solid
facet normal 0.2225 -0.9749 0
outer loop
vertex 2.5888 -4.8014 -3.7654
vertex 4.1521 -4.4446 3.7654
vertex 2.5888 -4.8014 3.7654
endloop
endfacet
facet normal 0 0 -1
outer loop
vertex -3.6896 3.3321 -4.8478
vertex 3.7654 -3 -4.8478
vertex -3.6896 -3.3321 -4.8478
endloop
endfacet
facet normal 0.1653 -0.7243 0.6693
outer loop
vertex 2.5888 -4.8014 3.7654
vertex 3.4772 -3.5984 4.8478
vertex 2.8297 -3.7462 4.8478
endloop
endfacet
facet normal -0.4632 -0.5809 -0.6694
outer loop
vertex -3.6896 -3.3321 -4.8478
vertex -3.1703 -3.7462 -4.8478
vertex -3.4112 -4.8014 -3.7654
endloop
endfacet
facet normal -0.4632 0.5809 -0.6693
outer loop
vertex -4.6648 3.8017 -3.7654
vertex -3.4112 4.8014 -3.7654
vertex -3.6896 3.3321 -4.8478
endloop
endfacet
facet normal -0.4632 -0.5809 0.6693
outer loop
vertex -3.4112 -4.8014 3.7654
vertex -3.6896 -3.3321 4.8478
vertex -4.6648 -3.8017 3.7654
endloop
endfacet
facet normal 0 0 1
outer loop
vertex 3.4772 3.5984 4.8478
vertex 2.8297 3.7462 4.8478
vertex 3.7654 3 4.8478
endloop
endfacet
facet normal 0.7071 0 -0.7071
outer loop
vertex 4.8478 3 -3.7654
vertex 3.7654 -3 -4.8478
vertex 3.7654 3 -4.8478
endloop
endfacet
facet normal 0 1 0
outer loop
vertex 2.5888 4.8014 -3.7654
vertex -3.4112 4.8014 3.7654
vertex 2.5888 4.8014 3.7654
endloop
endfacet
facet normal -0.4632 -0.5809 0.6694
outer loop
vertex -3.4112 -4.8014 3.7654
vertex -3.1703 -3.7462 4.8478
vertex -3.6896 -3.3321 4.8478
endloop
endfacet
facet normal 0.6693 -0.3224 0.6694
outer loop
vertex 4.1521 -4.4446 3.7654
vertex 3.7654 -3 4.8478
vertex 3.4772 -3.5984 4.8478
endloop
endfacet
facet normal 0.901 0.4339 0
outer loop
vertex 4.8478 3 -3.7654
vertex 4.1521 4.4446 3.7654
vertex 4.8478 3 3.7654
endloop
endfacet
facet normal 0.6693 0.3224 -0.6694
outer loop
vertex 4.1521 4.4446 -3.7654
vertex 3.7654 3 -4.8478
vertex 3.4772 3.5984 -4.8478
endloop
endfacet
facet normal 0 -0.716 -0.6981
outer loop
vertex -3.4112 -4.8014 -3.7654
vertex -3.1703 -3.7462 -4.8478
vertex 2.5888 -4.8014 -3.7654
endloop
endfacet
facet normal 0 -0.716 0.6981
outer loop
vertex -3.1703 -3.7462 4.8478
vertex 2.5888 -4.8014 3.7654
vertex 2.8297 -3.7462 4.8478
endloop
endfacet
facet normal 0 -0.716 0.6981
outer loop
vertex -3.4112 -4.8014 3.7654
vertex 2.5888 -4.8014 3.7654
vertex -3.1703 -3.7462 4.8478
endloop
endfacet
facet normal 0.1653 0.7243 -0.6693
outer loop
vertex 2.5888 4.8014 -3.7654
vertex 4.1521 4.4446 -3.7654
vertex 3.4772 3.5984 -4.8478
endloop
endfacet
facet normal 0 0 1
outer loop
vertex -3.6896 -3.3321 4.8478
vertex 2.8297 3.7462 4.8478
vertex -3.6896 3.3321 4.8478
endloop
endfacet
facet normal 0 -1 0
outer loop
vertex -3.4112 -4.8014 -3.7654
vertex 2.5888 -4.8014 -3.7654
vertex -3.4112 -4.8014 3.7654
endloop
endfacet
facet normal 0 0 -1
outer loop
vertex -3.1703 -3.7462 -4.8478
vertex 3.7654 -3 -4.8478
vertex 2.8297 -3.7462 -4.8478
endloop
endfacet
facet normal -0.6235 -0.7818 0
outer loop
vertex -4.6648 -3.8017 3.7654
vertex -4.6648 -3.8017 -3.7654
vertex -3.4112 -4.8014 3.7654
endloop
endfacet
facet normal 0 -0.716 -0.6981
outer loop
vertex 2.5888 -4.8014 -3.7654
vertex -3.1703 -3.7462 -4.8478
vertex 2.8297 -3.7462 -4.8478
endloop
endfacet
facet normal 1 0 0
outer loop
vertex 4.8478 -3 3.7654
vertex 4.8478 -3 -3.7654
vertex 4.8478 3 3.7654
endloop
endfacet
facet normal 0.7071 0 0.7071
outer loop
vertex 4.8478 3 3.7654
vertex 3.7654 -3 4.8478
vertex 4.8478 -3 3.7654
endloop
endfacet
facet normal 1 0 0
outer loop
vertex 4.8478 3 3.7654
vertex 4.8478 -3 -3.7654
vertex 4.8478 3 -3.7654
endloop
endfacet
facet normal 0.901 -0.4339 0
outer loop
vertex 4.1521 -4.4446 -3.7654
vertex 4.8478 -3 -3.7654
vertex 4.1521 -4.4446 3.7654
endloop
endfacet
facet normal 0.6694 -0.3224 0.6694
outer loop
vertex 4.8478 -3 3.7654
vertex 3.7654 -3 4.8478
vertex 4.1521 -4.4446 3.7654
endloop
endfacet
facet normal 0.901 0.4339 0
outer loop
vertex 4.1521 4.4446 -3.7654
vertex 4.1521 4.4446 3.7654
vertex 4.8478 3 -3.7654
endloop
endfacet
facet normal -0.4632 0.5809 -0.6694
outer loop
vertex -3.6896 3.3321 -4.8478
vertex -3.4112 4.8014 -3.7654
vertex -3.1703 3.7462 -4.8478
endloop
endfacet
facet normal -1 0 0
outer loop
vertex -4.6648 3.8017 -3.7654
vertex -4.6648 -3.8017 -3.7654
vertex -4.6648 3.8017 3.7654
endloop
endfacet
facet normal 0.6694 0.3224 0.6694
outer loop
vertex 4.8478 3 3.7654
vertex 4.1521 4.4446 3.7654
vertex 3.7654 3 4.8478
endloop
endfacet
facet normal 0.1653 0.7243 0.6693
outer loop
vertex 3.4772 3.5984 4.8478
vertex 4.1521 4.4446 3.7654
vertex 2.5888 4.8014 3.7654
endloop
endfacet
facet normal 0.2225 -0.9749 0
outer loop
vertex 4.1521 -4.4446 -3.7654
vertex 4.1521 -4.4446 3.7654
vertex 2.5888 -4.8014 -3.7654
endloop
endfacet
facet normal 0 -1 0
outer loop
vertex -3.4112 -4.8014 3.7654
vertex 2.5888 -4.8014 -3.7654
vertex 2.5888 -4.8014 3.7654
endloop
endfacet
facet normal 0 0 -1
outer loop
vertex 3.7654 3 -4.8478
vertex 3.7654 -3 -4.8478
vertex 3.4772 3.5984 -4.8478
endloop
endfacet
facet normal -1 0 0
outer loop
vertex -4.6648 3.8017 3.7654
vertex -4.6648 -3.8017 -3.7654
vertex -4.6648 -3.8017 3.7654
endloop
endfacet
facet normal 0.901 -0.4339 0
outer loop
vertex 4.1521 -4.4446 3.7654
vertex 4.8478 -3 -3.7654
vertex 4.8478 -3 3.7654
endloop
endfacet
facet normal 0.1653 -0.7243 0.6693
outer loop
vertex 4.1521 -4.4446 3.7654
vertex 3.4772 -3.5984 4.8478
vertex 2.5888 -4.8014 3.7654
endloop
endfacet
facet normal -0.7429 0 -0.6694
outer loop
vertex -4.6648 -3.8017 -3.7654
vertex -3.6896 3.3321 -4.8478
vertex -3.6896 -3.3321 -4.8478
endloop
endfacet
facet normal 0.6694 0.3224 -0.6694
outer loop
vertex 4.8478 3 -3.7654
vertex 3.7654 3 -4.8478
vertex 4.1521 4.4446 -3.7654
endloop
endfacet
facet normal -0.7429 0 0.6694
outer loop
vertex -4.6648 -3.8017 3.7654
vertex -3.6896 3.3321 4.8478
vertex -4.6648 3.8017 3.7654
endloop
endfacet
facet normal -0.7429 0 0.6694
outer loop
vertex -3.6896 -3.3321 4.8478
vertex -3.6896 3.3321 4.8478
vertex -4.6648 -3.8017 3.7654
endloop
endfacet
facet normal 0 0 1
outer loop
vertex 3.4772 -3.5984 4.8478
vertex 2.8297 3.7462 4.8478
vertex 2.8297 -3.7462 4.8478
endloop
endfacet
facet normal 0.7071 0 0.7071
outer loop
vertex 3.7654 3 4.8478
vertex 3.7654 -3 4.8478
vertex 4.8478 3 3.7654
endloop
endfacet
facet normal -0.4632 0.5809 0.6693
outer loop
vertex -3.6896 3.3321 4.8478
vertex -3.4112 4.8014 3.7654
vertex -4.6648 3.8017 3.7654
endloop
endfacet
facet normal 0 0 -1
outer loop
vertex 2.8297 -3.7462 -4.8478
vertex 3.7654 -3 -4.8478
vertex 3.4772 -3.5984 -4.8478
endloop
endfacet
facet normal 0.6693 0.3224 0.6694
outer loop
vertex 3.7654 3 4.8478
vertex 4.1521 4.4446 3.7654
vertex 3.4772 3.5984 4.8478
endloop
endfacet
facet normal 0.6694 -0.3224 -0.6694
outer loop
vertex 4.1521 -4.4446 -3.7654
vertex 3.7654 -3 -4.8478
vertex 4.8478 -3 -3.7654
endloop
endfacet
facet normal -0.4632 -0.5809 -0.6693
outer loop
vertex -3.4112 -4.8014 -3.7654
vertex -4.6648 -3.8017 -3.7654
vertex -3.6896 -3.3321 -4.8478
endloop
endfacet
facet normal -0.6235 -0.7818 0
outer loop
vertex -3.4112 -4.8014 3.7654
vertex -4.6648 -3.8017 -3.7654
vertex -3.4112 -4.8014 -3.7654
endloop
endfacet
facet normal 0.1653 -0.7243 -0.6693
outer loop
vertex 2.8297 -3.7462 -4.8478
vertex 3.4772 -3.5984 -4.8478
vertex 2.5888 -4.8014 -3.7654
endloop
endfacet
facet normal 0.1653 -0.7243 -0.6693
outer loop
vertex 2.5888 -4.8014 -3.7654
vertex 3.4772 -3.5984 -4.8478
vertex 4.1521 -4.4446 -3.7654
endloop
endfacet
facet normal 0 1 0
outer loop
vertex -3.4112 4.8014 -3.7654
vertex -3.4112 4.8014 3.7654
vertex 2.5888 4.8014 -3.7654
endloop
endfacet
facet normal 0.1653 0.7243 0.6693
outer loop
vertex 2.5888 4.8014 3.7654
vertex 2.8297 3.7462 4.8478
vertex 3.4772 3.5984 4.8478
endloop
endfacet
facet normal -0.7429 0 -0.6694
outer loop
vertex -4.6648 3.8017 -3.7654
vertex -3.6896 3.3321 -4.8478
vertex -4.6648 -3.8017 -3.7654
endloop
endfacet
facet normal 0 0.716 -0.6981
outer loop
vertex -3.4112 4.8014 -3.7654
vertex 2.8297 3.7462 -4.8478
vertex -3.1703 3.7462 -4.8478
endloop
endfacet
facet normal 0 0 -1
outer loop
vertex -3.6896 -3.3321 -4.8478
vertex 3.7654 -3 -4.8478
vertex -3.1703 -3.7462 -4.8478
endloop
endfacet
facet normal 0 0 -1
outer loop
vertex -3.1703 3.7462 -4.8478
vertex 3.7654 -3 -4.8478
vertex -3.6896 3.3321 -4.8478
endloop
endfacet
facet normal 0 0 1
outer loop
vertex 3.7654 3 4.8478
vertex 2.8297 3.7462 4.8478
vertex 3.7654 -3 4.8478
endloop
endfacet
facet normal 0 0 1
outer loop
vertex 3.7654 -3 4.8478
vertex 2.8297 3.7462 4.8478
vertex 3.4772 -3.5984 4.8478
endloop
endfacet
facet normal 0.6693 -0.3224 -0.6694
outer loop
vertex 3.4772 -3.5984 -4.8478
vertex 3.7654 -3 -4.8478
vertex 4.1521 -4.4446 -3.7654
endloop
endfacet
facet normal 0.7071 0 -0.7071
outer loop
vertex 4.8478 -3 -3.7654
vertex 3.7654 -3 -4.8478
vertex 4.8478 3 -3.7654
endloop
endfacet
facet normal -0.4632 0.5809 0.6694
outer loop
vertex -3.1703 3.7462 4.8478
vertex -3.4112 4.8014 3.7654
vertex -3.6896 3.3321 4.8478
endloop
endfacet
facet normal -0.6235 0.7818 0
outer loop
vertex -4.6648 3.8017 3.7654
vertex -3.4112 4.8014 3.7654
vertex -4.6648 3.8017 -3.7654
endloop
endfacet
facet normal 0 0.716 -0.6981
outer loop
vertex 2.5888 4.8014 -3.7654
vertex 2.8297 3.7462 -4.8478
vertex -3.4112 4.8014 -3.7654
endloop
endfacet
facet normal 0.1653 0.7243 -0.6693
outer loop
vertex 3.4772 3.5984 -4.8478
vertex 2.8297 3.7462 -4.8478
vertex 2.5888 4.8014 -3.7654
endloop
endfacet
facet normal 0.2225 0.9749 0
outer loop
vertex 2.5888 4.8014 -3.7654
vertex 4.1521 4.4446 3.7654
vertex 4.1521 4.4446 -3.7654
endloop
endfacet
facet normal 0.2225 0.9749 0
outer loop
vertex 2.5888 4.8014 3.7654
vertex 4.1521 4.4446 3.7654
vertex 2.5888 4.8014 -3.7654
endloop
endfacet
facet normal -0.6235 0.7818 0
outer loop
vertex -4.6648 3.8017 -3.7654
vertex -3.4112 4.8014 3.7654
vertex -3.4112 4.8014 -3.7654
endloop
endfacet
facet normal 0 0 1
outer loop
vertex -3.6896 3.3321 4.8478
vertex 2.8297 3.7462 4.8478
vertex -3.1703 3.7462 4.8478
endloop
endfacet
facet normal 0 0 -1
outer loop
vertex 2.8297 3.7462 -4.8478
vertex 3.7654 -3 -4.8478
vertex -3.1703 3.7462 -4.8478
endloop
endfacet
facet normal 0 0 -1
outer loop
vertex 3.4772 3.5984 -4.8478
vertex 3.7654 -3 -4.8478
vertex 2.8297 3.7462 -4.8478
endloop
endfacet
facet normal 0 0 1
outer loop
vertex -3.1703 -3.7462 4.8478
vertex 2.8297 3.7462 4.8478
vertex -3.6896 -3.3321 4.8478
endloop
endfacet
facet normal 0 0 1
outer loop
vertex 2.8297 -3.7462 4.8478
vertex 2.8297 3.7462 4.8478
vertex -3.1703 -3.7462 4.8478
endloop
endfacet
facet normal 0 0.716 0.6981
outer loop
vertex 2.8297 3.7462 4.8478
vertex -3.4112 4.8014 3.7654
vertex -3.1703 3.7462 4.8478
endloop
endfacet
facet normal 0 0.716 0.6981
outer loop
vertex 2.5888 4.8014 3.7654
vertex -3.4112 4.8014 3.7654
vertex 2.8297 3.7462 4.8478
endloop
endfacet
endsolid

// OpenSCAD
// param: size=10, radius=2
module rounded_cube(size=10, radius=2) {
    minkowski() {
        cube([size-2*radius, size-2*radius, size-2*radius], center=true);
        sphere(r=radius);
    }
}
rounded_cube(size=10, radius=2);
